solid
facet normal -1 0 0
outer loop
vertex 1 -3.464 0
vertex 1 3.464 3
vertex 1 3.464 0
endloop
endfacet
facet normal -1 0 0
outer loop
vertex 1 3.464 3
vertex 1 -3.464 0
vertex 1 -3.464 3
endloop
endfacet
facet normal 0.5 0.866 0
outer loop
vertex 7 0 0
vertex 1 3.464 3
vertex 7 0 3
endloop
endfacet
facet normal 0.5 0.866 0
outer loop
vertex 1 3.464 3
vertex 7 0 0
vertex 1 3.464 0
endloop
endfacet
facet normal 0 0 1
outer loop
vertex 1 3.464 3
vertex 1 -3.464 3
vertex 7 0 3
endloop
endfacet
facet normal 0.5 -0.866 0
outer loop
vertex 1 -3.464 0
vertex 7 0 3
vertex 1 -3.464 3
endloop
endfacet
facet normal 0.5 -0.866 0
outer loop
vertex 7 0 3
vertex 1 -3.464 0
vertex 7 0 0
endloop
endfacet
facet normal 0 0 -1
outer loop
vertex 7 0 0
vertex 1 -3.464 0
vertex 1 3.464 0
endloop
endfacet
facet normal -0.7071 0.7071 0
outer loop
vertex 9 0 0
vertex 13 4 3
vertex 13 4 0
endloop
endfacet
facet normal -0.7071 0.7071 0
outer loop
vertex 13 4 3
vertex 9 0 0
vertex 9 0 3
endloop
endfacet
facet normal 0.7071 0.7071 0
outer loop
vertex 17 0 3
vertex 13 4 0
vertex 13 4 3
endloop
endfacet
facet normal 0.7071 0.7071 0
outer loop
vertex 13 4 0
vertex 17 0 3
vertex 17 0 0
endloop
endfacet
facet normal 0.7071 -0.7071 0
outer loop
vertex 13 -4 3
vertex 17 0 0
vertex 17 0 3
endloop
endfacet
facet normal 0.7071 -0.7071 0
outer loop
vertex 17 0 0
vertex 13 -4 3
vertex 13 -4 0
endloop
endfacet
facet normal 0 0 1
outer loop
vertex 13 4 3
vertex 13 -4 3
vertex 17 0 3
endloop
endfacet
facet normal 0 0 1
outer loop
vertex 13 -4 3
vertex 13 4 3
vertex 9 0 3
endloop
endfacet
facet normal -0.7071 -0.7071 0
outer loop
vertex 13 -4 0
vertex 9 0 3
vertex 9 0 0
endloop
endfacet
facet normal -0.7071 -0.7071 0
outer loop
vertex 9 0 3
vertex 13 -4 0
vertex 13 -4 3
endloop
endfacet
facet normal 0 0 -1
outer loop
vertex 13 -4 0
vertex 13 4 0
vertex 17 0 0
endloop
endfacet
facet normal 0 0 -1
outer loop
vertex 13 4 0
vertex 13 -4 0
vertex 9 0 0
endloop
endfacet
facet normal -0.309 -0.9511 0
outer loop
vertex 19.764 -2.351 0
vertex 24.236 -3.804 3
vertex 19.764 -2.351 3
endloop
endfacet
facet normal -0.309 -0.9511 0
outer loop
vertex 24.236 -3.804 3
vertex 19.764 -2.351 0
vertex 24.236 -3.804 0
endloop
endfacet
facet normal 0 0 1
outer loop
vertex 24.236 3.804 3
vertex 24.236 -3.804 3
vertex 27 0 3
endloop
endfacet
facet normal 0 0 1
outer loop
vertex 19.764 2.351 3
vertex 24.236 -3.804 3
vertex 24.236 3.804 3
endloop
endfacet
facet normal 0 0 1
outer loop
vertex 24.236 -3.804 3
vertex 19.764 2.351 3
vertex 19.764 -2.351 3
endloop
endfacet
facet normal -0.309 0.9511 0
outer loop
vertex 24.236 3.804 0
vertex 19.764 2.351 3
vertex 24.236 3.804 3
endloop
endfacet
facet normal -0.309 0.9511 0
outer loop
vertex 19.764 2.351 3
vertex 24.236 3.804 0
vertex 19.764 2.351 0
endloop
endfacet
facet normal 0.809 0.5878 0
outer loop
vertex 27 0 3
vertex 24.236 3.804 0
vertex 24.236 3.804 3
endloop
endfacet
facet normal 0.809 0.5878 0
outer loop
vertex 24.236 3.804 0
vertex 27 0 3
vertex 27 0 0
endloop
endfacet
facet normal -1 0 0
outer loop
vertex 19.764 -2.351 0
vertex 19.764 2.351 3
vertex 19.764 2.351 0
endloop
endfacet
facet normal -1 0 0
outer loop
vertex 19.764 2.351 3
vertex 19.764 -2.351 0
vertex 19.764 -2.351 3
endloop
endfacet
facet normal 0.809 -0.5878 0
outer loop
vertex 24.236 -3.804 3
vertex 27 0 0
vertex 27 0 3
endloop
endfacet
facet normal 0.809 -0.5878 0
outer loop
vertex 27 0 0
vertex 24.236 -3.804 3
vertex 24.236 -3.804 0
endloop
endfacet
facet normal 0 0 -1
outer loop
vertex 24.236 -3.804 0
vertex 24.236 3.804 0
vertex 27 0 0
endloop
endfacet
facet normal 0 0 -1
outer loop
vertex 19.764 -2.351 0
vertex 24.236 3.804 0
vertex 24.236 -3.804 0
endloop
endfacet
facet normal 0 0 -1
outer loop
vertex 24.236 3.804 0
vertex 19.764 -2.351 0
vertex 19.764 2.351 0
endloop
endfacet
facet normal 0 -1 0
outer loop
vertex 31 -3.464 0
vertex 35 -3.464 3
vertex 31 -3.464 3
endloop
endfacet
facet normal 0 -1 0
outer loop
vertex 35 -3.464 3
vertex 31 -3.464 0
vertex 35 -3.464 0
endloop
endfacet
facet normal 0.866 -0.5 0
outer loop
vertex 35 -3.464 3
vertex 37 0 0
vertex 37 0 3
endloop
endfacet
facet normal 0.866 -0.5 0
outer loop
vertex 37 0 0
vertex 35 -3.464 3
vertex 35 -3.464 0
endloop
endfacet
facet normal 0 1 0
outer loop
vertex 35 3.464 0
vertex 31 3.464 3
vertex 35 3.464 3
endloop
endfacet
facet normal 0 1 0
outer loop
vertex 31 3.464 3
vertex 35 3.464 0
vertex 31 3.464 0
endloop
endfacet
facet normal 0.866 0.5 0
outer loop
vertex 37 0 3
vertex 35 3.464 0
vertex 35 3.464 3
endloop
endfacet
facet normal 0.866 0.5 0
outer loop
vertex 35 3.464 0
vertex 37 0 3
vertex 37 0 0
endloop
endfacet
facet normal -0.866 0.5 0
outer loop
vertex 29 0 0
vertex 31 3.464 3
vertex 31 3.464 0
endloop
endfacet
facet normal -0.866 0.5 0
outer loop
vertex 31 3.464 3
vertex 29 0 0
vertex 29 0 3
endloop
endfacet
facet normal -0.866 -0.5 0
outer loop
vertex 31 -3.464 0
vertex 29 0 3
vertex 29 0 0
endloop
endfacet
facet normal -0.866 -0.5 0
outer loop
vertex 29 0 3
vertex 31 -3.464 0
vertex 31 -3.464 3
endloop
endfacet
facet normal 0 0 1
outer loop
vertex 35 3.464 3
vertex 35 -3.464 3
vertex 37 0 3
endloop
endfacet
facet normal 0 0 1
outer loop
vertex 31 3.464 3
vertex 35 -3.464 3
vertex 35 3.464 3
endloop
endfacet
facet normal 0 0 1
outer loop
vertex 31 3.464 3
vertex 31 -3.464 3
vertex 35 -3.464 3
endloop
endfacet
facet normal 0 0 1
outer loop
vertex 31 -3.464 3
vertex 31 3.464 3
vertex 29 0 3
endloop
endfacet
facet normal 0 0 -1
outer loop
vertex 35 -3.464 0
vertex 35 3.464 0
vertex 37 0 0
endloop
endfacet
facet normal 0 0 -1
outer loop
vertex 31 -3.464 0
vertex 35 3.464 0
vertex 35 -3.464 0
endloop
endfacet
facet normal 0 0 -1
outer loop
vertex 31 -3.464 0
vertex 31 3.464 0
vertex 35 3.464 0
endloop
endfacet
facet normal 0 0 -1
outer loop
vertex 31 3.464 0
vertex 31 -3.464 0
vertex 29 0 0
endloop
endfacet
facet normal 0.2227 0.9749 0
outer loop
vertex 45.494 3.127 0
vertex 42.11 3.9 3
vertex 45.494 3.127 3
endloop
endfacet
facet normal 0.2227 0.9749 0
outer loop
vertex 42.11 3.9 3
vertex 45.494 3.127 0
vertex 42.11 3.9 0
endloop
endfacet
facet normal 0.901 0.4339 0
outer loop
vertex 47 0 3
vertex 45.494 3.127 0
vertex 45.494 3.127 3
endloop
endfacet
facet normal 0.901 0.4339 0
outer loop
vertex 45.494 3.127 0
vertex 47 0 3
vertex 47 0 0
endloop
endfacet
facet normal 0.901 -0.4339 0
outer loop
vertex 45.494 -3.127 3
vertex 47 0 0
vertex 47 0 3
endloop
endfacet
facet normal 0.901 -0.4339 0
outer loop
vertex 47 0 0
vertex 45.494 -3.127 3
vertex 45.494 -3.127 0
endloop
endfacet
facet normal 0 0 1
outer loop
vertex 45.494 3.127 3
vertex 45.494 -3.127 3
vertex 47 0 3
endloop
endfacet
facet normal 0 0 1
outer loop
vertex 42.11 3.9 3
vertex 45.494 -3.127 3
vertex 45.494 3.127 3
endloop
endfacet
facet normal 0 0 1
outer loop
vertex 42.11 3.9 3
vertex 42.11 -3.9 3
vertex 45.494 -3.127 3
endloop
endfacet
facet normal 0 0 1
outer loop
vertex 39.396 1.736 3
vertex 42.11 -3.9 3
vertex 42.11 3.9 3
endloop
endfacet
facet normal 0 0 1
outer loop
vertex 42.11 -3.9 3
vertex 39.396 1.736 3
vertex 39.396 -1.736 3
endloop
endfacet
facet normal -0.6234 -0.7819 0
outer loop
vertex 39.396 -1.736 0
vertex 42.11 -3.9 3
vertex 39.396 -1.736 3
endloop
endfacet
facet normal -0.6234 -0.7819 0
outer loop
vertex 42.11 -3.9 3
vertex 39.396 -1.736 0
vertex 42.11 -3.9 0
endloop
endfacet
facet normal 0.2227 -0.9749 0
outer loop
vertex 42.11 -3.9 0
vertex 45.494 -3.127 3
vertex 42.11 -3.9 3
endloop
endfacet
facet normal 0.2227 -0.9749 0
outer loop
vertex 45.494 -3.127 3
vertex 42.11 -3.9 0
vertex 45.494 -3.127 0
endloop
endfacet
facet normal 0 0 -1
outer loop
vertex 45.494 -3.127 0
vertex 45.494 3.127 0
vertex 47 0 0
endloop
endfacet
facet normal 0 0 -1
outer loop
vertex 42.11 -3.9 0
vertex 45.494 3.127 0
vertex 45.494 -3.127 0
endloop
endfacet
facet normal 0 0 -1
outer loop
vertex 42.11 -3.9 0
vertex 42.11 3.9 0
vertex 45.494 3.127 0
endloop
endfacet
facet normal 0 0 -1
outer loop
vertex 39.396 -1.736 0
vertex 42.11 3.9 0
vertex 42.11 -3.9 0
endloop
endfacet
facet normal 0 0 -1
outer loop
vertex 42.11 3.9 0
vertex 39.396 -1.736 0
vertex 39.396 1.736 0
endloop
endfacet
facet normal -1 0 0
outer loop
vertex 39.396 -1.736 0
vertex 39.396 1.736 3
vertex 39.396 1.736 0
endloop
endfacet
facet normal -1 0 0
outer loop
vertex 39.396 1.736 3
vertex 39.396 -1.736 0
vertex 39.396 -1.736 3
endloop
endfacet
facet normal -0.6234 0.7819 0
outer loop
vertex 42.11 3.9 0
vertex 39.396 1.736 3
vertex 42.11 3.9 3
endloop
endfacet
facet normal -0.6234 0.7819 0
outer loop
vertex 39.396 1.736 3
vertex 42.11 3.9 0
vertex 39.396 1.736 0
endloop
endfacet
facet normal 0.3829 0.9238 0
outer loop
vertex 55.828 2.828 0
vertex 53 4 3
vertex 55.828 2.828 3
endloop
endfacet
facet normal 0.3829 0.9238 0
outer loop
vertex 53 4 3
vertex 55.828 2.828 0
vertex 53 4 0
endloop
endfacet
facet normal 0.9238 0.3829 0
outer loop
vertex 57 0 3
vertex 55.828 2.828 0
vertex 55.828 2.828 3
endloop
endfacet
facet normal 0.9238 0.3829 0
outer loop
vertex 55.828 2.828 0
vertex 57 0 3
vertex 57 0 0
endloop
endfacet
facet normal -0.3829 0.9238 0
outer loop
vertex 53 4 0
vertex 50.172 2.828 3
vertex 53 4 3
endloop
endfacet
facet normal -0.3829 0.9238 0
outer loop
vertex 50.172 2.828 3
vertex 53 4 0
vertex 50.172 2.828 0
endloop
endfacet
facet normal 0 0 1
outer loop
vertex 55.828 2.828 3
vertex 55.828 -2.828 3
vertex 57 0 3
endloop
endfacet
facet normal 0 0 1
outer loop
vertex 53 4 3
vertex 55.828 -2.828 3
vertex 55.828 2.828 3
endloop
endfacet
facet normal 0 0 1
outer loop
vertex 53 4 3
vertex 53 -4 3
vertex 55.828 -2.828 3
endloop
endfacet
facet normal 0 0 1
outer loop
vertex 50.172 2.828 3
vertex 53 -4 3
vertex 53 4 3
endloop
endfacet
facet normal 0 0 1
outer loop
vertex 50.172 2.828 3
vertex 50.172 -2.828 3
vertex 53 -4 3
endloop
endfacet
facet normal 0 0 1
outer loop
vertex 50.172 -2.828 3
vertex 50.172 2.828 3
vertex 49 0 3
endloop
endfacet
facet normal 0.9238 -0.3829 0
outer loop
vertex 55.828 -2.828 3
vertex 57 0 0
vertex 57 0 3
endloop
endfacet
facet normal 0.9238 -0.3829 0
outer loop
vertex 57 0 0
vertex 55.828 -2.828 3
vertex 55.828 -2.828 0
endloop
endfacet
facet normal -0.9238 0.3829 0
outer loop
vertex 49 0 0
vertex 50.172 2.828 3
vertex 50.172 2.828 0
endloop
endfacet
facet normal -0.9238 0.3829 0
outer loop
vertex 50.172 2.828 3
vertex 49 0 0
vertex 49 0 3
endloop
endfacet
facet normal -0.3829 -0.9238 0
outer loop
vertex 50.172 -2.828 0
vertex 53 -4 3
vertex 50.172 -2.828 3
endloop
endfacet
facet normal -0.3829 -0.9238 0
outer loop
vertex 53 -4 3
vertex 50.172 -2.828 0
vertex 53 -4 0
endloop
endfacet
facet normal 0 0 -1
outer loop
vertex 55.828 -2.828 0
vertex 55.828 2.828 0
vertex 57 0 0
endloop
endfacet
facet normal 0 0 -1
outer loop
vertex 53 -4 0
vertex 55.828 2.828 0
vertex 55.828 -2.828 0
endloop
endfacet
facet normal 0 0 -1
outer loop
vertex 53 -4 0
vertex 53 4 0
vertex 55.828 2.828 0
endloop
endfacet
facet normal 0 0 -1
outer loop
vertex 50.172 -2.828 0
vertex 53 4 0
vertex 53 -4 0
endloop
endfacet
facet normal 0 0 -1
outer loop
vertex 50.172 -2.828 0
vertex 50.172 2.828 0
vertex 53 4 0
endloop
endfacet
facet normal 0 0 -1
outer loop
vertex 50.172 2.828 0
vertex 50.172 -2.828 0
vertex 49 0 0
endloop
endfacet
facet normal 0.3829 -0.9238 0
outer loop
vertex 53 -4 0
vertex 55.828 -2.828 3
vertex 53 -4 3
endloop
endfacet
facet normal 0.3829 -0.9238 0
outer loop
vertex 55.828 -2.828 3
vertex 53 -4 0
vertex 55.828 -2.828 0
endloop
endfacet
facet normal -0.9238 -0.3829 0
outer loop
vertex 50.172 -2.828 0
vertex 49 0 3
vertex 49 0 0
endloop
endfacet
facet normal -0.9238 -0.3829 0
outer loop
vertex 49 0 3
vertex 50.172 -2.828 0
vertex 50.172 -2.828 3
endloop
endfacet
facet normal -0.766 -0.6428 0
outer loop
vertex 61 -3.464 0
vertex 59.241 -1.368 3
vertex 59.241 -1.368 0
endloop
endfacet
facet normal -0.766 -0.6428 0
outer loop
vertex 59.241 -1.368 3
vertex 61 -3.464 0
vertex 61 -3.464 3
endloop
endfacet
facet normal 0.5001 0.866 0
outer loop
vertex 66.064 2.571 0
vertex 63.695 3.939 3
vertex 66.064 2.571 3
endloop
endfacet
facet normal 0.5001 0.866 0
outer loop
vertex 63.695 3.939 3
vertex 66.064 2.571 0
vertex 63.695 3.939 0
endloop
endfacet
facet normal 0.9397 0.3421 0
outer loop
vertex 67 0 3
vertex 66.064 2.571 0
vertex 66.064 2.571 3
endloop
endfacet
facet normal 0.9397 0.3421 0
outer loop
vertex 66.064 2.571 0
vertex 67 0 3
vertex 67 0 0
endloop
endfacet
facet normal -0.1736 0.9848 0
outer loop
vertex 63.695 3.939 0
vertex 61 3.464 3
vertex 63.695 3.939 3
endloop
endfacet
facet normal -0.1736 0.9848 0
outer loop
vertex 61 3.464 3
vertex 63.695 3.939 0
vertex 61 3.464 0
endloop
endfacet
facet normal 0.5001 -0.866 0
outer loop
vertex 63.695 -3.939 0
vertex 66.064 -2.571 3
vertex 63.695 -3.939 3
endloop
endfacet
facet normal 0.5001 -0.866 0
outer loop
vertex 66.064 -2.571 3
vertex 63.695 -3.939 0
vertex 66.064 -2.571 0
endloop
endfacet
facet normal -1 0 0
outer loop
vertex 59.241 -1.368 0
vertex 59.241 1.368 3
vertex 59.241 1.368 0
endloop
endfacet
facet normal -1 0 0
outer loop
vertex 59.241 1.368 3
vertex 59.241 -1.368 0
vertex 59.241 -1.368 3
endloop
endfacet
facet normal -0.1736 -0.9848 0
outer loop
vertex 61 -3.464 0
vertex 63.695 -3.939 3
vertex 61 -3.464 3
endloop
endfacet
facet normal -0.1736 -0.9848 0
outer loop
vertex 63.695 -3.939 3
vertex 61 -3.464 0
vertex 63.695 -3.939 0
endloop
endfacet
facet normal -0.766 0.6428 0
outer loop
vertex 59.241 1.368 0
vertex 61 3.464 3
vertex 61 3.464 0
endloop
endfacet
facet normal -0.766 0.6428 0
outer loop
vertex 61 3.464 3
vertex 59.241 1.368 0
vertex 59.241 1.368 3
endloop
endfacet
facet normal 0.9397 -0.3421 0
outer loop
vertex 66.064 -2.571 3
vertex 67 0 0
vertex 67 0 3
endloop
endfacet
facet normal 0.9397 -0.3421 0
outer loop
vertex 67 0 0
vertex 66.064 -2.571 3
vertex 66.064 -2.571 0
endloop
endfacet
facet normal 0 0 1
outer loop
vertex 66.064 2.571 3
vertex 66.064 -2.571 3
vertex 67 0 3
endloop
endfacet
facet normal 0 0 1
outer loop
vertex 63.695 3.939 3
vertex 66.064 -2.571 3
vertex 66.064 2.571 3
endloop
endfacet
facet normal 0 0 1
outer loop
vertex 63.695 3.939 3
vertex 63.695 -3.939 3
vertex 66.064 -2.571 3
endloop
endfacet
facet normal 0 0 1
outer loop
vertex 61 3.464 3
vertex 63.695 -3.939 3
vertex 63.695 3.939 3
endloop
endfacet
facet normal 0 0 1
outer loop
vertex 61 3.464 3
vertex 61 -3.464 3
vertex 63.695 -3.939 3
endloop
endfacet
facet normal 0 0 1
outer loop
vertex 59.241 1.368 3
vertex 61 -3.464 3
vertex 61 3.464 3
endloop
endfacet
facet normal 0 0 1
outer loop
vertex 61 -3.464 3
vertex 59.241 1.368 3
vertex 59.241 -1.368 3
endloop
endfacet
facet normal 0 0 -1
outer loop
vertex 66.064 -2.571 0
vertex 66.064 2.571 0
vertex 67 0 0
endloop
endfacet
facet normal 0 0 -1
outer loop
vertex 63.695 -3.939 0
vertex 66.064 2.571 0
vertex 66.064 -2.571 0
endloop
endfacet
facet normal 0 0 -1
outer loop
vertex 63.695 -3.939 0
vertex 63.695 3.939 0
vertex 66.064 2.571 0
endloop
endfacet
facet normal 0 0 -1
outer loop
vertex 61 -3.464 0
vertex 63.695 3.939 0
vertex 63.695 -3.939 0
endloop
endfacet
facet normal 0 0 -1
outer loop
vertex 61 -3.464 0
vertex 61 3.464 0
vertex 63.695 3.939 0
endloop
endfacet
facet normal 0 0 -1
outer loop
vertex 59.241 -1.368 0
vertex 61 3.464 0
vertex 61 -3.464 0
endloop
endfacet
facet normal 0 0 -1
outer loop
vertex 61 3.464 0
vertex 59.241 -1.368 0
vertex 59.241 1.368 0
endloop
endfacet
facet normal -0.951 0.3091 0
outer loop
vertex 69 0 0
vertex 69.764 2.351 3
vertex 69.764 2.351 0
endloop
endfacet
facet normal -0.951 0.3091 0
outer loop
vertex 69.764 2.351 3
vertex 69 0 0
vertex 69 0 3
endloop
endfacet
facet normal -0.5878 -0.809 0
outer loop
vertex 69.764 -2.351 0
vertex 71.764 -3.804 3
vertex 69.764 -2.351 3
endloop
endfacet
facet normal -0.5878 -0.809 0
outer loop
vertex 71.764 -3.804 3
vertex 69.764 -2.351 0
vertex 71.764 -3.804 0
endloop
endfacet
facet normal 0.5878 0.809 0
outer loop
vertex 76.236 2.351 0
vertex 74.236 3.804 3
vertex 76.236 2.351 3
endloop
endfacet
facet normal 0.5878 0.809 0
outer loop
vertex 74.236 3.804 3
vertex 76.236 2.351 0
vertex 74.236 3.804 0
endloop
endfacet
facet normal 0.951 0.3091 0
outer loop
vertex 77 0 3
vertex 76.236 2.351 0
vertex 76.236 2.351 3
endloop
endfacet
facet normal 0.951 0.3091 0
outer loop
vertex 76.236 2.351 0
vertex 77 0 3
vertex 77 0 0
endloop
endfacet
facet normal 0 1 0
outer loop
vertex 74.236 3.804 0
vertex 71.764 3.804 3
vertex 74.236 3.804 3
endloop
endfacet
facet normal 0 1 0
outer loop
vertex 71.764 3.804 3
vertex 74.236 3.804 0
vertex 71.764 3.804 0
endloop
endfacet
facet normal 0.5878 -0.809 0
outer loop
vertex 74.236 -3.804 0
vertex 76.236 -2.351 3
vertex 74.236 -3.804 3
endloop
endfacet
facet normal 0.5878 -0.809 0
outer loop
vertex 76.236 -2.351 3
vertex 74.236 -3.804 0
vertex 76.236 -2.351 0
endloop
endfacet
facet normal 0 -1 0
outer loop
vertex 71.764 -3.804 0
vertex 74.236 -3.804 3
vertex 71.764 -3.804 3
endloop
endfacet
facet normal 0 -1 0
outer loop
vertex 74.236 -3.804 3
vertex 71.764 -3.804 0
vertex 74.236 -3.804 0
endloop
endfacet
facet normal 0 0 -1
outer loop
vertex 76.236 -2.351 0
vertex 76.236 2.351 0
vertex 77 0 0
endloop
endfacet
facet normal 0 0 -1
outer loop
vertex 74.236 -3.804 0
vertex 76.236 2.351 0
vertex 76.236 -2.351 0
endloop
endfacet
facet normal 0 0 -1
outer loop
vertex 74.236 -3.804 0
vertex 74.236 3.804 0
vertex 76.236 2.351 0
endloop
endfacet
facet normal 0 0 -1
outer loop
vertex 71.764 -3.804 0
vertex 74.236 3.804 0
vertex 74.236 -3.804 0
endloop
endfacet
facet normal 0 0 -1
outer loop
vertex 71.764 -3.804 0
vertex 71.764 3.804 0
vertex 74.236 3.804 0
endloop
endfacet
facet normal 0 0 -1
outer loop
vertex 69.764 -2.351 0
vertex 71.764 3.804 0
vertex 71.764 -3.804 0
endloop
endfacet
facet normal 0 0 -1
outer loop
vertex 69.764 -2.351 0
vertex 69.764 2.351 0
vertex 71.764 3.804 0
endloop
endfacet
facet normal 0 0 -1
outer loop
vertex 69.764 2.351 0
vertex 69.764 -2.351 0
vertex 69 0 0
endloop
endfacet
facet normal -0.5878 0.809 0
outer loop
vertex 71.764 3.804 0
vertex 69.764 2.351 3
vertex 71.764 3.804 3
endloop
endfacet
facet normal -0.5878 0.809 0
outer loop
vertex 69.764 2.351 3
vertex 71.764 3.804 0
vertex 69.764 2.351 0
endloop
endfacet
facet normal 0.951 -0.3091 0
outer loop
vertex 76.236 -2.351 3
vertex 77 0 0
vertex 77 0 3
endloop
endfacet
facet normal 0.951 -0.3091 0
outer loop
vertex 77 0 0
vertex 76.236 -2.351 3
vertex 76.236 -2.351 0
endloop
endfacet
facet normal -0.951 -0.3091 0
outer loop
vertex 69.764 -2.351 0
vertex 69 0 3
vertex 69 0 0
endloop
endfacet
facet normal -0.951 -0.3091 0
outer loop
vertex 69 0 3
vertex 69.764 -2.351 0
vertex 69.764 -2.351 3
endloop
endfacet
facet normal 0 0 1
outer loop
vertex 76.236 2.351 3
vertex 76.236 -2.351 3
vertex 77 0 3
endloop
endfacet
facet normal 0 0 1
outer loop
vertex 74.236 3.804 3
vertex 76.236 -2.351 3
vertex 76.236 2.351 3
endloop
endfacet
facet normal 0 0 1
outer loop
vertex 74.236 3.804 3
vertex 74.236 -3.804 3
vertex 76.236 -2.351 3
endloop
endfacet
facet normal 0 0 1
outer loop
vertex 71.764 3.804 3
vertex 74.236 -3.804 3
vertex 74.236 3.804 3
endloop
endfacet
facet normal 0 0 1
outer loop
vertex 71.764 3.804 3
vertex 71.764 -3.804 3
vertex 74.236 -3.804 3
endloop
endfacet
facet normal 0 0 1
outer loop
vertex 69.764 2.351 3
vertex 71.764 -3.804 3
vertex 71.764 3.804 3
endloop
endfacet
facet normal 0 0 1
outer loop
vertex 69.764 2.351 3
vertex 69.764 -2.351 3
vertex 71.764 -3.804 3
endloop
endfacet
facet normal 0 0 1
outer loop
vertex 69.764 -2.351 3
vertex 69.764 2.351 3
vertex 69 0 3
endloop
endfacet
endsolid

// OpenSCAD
for(s=[3,4,5,6,7,8,9,10]){
translate([(s-3)*10+3,0,0])cylinder(h=3, r=4, $fn=s); 
}
